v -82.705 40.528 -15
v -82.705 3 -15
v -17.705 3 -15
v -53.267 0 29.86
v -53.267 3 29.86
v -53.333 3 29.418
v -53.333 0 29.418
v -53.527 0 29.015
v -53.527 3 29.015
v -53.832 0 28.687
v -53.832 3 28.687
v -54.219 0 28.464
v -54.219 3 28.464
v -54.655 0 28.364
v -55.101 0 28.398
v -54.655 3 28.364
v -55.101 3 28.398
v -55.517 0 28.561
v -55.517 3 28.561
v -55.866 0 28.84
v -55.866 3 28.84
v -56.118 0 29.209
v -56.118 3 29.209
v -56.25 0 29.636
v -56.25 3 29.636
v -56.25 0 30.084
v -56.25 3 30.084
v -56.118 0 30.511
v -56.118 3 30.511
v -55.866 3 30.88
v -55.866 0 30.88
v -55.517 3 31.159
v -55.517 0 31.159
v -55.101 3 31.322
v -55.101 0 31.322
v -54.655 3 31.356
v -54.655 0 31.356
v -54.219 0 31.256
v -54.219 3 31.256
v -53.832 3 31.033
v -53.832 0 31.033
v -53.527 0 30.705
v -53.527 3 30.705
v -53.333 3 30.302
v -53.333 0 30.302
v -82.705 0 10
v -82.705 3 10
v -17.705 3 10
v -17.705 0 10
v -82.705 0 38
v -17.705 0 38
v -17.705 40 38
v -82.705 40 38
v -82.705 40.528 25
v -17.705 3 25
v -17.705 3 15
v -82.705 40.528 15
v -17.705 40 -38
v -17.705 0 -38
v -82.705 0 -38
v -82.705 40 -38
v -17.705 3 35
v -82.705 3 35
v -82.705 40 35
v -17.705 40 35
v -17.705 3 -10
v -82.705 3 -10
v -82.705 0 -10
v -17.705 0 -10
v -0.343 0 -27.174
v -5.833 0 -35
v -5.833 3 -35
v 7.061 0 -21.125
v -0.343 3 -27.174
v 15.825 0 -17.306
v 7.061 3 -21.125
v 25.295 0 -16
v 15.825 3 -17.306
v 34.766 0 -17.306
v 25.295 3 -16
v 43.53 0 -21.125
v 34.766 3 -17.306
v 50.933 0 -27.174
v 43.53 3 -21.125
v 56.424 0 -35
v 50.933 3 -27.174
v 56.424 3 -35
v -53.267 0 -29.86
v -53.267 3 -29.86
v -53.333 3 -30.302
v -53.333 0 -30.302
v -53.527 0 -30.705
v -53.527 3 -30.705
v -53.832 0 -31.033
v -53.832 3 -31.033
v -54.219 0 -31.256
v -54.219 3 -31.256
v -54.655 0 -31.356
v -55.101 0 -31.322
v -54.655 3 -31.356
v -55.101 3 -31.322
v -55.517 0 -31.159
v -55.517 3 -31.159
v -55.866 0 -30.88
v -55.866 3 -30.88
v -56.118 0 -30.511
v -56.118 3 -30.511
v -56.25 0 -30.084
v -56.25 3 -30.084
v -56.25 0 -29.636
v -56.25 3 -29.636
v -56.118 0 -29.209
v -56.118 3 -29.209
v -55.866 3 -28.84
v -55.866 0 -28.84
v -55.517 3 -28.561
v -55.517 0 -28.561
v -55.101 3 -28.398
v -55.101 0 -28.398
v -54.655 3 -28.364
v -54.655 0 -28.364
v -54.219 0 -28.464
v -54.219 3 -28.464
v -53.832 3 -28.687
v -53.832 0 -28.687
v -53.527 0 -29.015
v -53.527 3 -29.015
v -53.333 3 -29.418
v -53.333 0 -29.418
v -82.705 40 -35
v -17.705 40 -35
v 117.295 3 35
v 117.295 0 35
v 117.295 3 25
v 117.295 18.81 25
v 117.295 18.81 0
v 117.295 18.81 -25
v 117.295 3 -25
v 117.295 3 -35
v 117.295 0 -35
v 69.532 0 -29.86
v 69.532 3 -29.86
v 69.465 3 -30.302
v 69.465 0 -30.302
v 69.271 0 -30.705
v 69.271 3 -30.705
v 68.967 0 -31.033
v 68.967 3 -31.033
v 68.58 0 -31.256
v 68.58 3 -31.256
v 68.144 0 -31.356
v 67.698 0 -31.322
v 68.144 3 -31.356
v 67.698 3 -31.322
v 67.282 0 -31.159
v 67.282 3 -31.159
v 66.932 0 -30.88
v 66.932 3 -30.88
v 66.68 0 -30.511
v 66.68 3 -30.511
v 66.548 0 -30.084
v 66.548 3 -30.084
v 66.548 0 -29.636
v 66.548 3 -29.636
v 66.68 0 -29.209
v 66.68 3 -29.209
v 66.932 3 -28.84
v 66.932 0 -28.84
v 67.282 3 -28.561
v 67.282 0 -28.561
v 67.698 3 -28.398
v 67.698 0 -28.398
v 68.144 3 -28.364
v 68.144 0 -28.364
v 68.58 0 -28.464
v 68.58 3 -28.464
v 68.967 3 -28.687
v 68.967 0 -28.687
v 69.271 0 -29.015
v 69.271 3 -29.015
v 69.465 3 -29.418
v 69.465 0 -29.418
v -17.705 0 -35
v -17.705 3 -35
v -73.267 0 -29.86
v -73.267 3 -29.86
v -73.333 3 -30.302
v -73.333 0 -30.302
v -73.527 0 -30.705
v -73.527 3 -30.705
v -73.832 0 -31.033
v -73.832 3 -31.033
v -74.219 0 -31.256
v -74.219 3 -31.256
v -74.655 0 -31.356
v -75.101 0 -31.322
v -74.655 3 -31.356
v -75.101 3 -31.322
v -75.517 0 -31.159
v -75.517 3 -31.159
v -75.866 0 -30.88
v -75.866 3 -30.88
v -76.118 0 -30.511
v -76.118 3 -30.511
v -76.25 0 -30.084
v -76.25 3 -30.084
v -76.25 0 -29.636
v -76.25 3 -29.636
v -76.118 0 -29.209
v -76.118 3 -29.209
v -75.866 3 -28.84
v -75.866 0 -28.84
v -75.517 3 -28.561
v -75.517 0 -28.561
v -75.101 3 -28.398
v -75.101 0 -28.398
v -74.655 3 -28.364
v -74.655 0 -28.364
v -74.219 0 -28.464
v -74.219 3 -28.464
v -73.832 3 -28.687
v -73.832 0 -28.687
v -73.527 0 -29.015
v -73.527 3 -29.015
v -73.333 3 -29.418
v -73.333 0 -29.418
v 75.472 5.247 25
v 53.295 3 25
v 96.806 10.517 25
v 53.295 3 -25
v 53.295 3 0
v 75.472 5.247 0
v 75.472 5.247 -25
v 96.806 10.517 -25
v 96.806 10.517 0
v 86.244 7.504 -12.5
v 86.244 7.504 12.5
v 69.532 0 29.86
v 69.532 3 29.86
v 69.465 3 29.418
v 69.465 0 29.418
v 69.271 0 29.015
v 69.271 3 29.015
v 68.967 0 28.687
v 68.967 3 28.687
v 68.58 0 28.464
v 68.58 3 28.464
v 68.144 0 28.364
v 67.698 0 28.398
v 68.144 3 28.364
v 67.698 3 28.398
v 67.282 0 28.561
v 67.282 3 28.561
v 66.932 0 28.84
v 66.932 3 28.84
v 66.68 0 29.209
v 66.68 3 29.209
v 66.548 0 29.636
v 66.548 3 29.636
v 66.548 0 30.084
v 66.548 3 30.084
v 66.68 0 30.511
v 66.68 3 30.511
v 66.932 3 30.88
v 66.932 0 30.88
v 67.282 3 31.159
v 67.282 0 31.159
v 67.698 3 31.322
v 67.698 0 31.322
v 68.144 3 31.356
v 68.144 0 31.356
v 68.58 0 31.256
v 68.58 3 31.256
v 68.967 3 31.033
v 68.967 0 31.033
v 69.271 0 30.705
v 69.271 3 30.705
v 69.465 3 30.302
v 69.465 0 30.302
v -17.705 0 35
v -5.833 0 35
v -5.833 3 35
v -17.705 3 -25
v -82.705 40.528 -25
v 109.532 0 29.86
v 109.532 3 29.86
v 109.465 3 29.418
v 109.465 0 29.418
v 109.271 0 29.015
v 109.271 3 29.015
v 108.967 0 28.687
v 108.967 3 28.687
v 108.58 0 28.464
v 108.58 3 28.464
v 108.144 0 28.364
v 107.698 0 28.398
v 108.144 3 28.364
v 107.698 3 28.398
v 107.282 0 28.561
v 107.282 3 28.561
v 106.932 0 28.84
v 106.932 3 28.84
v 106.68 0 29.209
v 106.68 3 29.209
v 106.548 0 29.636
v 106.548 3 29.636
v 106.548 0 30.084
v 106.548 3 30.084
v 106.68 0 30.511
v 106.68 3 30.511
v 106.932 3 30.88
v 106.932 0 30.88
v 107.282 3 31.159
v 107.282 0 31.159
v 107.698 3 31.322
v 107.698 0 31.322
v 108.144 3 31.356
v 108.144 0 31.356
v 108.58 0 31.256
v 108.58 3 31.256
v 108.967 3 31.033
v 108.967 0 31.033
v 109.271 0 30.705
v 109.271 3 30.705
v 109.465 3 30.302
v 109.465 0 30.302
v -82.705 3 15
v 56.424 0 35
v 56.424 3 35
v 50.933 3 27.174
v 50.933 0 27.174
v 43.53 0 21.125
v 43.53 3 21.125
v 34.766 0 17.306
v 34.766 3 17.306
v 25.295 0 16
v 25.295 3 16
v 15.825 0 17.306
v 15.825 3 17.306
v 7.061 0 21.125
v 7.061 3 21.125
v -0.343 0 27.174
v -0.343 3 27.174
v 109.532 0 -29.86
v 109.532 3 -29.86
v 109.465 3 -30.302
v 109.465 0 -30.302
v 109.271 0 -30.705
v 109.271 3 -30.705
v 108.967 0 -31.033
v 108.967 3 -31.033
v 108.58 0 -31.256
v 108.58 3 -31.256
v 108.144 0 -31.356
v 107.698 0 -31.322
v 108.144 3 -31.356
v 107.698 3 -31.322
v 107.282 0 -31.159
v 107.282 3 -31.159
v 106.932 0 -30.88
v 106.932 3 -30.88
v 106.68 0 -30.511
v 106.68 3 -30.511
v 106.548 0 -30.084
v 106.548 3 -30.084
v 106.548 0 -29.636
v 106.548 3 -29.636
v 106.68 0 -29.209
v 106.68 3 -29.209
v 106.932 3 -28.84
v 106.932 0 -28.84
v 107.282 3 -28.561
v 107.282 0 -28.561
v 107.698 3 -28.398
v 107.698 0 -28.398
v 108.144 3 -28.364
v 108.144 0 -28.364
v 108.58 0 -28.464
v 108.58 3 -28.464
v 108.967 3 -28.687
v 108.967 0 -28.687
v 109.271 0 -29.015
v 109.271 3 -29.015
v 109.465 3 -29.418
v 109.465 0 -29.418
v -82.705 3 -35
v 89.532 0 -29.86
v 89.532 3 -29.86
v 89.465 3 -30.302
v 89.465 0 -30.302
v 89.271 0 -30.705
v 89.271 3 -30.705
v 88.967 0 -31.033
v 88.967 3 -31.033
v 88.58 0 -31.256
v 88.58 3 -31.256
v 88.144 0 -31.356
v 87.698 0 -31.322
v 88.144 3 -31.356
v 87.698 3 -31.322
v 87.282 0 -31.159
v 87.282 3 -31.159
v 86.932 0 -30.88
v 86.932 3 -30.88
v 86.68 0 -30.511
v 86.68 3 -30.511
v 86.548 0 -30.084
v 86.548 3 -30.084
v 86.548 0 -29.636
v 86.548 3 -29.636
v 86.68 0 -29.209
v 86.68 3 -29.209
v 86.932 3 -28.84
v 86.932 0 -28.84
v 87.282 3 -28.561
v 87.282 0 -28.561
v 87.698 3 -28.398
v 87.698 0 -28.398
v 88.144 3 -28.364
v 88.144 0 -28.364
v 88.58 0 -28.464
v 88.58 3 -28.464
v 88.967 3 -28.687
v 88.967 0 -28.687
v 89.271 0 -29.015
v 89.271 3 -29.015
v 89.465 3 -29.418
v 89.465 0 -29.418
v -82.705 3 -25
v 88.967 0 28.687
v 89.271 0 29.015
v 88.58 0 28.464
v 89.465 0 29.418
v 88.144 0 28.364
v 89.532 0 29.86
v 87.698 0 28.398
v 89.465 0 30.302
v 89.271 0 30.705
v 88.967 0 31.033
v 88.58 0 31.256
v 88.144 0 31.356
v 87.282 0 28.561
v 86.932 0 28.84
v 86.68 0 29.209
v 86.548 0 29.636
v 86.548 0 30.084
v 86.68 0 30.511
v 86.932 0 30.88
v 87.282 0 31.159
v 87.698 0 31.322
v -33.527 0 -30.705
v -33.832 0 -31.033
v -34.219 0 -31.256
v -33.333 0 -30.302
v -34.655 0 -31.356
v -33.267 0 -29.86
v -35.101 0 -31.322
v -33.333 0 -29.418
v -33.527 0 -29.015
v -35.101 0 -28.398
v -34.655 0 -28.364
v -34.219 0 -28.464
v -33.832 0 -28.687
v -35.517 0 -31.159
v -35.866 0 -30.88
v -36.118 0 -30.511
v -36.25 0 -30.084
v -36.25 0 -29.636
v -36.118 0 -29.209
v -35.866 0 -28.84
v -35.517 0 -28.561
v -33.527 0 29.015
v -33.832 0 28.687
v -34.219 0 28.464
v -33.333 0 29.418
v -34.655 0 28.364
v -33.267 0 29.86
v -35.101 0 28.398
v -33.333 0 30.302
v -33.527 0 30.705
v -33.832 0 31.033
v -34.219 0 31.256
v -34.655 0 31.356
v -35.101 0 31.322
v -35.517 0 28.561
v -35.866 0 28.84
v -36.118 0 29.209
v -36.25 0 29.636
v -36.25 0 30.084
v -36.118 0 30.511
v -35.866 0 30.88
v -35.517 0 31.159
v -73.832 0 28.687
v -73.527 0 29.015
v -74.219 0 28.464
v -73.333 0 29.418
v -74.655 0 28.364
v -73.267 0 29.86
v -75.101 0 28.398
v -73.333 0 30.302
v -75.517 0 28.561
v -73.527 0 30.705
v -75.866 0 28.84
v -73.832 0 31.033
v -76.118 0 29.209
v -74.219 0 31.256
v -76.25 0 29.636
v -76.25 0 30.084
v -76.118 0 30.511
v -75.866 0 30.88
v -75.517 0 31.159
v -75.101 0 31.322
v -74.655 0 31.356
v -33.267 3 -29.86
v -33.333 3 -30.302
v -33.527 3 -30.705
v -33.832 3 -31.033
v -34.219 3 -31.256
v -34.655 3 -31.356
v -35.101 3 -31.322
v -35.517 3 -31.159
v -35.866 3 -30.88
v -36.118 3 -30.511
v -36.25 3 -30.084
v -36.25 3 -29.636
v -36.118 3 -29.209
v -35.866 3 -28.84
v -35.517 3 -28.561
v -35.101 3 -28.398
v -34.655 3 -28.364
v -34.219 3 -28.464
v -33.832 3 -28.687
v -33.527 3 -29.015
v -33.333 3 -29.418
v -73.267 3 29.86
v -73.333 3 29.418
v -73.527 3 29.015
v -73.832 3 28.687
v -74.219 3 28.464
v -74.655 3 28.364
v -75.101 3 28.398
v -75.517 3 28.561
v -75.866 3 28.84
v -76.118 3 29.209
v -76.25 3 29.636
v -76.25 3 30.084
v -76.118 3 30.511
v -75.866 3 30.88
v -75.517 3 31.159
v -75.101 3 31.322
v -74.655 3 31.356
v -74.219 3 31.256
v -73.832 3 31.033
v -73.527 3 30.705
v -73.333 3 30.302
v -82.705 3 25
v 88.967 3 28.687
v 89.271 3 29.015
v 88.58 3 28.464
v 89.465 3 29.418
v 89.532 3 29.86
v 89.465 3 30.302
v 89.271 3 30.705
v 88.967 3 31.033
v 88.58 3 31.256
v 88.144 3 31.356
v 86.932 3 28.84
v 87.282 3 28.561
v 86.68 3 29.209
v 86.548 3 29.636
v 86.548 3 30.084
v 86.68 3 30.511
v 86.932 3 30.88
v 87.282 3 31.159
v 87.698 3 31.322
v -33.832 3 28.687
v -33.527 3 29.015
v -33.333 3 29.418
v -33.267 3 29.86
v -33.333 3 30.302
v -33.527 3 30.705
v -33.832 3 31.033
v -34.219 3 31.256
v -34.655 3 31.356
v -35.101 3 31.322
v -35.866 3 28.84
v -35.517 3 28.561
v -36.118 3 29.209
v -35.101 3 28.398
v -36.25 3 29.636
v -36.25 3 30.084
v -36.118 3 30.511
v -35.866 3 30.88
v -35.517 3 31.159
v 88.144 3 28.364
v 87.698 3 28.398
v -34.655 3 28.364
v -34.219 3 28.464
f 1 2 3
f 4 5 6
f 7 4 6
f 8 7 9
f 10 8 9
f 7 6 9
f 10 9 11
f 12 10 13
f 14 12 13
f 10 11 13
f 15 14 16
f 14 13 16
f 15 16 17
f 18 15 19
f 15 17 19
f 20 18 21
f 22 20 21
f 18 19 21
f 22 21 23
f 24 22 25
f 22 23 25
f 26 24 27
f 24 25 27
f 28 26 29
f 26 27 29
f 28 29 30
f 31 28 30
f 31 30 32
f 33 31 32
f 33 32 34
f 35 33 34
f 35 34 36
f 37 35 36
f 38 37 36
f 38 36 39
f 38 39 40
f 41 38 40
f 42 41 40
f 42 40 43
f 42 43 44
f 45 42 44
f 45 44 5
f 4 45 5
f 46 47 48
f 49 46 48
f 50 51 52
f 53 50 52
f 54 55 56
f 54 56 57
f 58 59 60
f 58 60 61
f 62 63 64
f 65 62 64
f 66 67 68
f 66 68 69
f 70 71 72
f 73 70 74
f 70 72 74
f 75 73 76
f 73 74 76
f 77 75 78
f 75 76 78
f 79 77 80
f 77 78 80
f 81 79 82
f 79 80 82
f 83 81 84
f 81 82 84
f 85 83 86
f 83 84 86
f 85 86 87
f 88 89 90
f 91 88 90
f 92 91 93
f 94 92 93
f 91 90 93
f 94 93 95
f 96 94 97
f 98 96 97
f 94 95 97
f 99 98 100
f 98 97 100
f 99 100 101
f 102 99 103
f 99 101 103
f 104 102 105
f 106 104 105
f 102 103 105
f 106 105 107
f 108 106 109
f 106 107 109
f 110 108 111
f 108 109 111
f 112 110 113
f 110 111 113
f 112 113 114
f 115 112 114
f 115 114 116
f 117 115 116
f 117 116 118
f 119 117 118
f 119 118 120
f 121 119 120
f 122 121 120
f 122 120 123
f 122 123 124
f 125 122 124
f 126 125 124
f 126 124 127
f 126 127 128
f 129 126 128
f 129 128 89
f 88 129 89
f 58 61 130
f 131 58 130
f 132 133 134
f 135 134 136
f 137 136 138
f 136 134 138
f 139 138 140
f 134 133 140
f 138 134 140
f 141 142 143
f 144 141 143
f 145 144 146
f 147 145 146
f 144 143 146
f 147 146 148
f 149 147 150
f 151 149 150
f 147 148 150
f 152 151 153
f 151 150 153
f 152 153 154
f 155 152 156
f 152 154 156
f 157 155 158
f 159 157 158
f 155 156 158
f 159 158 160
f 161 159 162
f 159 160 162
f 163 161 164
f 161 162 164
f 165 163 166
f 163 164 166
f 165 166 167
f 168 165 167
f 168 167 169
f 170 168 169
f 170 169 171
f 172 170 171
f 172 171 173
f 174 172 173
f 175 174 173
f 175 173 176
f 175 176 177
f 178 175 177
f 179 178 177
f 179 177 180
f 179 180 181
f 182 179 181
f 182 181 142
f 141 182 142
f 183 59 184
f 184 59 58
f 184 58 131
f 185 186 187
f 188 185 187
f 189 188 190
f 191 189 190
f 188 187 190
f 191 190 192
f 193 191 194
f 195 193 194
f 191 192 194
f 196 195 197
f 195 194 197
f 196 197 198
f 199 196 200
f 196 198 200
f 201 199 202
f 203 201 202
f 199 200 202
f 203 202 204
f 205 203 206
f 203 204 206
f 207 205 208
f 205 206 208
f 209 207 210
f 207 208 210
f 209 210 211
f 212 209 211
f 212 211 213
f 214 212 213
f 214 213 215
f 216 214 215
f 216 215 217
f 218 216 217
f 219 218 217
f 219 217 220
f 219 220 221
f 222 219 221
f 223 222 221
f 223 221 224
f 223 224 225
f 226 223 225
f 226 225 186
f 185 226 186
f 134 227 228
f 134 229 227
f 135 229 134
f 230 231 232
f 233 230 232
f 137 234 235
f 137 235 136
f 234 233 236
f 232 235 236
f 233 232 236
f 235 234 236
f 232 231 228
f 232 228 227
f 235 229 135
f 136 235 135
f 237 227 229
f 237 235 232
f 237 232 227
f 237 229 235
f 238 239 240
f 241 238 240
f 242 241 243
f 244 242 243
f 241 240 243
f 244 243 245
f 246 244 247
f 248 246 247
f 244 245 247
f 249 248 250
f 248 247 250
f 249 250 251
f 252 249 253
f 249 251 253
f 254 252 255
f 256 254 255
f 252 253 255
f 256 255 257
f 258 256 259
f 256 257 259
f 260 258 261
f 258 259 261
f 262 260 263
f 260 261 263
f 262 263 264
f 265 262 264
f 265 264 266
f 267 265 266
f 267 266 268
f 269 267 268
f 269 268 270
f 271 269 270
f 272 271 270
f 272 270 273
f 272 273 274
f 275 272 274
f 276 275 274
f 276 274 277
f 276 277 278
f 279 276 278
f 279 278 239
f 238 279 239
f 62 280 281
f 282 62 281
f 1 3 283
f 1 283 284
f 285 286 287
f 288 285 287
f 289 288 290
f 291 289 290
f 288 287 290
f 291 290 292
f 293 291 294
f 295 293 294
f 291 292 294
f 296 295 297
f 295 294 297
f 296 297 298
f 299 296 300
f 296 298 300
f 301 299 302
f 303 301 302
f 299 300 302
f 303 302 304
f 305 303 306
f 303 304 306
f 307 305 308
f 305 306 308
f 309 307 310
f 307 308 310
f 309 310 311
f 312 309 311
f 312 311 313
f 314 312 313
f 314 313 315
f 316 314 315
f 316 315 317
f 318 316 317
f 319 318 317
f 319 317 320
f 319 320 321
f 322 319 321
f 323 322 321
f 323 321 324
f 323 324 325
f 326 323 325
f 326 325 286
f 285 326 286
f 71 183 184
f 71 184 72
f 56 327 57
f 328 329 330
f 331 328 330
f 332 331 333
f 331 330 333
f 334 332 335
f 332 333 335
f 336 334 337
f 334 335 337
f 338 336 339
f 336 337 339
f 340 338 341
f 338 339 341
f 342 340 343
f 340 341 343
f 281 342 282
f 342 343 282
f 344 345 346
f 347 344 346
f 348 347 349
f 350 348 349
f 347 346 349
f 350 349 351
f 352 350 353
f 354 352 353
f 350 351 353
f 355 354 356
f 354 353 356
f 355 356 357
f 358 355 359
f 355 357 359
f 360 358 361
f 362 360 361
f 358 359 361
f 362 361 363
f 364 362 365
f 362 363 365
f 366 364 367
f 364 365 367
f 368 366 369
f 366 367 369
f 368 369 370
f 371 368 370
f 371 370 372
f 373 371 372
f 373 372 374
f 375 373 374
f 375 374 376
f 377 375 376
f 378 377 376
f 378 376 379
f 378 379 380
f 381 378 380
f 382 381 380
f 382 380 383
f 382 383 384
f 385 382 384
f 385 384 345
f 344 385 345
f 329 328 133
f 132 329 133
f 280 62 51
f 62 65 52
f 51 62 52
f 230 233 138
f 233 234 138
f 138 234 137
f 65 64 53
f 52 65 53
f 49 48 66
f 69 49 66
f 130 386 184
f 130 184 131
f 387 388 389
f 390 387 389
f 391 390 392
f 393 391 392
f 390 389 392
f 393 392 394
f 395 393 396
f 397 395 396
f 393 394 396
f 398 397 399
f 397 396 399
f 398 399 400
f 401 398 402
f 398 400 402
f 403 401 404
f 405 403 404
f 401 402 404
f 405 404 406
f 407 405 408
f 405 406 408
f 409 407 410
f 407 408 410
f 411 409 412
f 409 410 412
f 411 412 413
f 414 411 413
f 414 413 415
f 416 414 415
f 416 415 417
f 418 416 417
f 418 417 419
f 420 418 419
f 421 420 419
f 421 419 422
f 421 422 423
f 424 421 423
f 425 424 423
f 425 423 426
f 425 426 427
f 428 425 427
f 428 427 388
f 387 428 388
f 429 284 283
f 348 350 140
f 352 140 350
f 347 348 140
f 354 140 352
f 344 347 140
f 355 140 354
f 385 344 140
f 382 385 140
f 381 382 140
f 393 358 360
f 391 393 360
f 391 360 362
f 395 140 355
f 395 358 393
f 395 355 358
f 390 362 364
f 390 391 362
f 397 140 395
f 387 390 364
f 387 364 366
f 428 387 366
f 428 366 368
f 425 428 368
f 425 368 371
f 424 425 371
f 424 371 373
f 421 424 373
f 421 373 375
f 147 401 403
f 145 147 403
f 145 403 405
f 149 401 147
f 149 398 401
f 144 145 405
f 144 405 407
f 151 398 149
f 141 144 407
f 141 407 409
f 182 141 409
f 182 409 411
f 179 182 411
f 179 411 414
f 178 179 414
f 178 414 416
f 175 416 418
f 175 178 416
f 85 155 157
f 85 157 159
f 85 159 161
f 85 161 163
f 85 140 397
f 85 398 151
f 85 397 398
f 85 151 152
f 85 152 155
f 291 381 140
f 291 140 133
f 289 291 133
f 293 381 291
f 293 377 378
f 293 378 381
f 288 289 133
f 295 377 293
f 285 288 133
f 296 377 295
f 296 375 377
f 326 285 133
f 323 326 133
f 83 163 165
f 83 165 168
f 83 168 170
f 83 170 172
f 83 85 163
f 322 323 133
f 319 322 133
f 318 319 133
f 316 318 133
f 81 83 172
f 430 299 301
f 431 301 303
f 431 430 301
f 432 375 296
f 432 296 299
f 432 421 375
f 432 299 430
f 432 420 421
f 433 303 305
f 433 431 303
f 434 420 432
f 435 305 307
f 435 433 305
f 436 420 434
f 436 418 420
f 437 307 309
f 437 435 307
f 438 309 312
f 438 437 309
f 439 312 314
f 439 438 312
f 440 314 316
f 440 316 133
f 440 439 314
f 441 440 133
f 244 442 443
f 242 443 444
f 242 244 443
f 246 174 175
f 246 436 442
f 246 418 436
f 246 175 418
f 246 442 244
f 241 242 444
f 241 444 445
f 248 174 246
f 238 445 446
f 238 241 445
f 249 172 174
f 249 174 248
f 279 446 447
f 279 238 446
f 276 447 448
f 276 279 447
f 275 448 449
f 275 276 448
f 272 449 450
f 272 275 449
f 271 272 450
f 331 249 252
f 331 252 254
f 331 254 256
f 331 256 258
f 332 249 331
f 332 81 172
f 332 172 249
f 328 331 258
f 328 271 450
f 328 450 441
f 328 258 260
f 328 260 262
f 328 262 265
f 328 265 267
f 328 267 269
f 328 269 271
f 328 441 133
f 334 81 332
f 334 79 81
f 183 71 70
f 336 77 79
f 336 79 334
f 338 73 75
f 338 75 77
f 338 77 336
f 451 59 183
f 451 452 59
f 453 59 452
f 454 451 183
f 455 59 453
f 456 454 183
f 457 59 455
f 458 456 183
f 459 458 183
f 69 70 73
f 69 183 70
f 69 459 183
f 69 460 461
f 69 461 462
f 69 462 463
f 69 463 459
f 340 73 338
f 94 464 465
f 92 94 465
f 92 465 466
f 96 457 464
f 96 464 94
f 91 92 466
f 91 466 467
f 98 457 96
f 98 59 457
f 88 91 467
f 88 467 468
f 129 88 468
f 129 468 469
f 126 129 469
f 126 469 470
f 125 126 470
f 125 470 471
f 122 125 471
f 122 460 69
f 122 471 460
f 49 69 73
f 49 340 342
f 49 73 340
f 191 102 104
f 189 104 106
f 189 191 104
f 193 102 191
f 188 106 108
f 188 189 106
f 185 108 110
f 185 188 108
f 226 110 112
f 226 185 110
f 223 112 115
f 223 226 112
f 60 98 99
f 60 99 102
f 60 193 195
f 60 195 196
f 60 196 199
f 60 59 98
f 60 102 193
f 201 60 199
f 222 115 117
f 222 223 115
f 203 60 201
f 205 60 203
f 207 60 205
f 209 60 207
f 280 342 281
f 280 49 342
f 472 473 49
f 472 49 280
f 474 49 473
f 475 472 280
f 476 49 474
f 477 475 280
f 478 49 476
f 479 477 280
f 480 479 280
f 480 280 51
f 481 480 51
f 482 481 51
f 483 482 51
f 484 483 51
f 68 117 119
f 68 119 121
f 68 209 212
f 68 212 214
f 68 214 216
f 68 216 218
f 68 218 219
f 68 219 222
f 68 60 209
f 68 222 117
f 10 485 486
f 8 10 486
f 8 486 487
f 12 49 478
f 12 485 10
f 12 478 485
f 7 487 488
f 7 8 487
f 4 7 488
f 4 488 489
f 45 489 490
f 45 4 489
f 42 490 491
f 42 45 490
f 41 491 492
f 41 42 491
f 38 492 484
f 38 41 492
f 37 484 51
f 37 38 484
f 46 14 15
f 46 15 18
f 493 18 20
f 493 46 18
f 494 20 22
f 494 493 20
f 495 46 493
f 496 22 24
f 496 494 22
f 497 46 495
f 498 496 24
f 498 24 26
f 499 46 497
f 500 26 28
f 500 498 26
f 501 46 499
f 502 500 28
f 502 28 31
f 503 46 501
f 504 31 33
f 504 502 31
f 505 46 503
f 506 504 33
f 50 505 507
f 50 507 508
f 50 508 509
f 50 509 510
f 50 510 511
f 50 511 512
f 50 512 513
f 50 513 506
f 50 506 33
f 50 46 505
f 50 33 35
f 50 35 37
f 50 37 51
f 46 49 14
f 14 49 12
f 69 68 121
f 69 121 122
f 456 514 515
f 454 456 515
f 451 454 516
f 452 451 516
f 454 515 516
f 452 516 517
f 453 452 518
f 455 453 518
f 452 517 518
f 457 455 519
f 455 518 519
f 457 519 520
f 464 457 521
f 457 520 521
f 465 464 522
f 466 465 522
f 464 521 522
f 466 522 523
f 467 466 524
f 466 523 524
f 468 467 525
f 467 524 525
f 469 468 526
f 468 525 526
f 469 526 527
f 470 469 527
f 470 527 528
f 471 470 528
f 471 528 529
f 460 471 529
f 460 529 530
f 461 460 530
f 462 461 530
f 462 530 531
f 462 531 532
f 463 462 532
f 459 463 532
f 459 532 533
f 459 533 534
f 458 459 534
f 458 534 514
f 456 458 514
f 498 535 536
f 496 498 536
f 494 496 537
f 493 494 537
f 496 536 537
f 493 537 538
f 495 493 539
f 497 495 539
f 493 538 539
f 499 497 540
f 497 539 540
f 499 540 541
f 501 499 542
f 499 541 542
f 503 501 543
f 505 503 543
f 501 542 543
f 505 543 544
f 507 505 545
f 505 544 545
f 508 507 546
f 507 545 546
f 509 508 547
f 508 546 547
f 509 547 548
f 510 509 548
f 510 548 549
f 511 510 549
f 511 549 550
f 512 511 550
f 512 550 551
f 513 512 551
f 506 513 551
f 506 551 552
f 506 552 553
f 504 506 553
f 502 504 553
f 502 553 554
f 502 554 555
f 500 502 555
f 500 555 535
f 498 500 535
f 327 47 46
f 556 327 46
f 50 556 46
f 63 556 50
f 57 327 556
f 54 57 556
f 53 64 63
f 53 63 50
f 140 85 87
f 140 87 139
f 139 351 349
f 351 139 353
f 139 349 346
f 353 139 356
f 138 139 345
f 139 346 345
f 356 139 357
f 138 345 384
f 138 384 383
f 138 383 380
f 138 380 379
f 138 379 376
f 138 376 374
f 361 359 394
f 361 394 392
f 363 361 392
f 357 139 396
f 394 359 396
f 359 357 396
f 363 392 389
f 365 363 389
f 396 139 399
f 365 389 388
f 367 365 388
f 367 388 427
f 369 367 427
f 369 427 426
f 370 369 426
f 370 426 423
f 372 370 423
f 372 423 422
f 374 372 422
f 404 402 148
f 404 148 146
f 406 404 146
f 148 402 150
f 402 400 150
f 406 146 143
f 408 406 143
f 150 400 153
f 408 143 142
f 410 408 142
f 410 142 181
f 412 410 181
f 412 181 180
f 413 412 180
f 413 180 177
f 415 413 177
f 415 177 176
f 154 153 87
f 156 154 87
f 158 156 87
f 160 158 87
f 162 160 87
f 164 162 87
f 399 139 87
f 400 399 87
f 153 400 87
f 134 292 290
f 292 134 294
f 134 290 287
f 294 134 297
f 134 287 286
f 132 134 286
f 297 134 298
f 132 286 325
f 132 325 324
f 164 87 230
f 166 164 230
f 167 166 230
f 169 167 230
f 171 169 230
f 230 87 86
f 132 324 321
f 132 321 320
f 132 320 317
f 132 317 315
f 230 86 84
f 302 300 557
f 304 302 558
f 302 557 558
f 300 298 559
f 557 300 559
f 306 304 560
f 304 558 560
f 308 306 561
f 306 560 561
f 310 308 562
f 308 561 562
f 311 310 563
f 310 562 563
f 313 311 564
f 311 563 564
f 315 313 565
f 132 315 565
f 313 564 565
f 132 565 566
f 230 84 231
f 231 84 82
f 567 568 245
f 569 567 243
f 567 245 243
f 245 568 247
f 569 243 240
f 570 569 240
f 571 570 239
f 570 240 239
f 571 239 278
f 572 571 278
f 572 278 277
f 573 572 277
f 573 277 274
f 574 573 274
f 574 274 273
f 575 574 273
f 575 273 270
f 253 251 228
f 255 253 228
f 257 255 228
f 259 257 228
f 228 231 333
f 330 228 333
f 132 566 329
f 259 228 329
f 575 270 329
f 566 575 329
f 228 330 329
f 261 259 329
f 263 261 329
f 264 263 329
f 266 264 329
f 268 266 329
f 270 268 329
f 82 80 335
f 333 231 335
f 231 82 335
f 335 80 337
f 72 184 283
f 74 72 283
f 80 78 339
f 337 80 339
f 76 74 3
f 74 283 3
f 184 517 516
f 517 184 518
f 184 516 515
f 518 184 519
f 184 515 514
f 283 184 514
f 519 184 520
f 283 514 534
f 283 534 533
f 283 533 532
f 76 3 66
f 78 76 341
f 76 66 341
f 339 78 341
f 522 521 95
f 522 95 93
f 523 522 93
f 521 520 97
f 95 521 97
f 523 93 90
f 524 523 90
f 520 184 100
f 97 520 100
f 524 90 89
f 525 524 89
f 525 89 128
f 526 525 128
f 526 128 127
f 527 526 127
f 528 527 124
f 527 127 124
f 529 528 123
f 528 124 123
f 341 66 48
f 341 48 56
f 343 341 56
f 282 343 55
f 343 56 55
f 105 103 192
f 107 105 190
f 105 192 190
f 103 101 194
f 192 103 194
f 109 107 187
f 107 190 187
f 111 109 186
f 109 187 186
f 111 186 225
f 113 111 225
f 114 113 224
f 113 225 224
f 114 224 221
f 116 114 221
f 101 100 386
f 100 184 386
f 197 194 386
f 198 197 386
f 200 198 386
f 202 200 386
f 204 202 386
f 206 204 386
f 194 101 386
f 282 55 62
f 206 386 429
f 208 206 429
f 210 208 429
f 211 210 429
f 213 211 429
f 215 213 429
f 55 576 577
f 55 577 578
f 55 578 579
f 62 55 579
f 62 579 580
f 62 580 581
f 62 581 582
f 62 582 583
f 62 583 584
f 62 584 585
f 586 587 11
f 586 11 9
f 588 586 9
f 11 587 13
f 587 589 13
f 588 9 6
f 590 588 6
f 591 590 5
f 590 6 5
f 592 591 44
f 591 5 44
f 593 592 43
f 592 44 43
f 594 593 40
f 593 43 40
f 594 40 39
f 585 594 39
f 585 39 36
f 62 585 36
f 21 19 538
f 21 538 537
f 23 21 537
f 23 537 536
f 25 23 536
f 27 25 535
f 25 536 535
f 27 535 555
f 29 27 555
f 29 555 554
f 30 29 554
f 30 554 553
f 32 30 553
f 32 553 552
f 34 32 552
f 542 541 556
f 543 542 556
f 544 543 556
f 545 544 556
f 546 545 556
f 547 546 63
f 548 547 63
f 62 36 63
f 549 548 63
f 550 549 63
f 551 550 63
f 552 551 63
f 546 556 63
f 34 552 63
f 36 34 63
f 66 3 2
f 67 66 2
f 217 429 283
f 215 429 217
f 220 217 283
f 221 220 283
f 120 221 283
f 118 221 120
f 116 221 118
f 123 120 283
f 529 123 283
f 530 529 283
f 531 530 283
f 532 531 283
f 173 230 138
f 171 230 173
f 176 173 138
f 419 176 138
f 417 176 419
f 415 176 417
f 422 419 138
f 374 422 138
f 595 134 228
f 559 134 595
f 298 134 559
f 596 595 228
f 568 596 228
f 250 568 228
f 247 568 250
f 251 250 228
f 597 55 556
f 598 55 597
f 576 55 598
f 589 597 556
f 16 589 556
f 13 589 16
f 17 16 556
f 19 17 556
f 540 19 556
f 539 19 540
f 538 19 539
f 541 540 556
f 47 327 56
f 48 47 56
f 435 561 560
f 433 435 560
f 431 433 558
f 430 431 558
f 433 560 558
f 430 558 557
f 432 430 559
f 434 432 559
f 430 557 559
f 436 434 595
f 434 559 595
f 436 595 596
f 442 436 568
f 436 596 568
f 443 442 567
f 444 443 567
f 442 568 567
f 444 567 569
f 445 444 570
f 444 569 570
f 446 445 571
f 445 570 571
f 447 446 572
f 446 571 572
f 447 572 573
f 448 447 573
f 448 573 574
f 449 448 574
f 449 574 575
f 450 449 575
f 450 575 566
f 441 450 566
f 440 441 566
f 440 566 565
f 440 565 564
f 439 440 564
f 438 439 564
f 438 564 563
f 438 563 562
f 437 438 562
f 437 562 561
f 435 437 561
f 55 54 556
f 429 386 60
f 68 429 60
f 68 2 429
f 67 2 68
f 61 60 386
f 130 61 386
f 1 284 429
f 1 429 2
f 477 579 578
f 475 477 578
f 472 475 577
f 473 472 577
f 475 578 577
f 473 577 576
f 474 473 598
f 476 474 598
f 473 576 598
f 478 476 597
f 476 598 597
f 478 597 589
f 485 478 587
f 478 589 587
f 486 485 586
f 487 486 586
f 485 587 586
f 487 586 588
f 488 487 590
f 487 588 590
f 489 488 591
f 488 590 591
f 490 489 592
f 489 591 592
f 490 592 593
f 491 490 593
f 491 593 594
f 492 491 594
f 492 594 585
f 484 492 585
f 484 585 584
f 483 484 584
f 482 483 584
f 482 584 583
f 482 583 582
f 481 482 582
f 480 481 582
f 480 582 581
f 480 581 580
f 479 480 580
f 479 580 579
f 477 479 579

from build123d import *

# Parameters (mm, degrees)
SKETCH_1_W           = 200
SKETCH_1_H           = 70
EXTRUDE_1_DEPTH      = 3
EXTRUDE_2_DEPTH      = 25
EXTRUDE_2_DEPTH_BACK = 25
SKETCH_6_W           = 30
SKETCH_6_H           = 37.527767497
CUT_EXTRUDE_4_DEPTH  = 65
SKETCH_7_R           = 35
CUT_EXTRUDE_5_DEPTH  = 4
SKETCH_8_W           = 3
SKETCH_8_H           = 40
EXTRUDE_3_DEPTH      = 65
SKETCH_9_R           = 1.5
CUT_EXTRUDE_6_DEPTH  = 4
SKETCH_11_W          = 65
SKETCH_11_H          = 20
CUT_EXTRUDE_7_DEPTH  = 4


with BuildPart() as part:
    # 草图1 → 凸台-拉伸1 (new body)
    with BuildSketch(Plane(origin=(0, 0, 0), x_dir=(1, 0, 0), z_dir=(0, 1, 0))):
        with Locations((17.295373665, 0)):
            Rectangle(SKETCH_1_W, SKETCH_1_H)
    extrude(amount=EXTRUDE_1_DEPTH)

    # 草图2 → 凸台-拉伸2 (add, two sides)
    with BuildSketch(Plane.XY) as extrude_2_sk:
        Polygon((-82.704626335, 40.527767497), (-82.704626335, 3), (-17.704626335, 3), align=None)
        with BuildLine():
            Line((117.295373665, 3), (117.295373665, 18.810437945))
            add(Edge.make_bspline(
                [(53.295373665, 3), (87.19337421, 4.102292249), (117.295373665, 18.810437945)],
                knots=[0, 0, 0, 1, 1, 1], degree=2))
            Line((53.295373665, 3), (117.295373665, 3))
        make_face()
    extrude(amount=EXTRUDE_2_DEPTH)
    extrude(extrude_2_sk.sketch, amount=-EXTRUDE_2_DEPTH_BACK)

    # 草图6 → 切除-拉伸4 (cut)
    with BuildSketch(Plane.ZY.offset(82.704626335)):
        with Locations((0, 21.763883748)):
            Rectangle(SKETCH_6_W, SKETCH_6_H)
    extrude(amount=-CUT_EXTRUDE_4_DEPTH, mode=Mode.SUBTRACT)

    # 草图7 → 切除-拉伸5 (cut, through all)
    with BuildSketch(Plane(origin=(0, 3, 0), x_dir=(1, 0, 0), z_dir=(0, 1, 0))):
        with Locations((25.295373665, 51)):
            Circle(SKETCH_7_R)
        with Locations((25.295373665, -51)):
            Circle(SKETCH_7_R)
    extrude(amount=-CUT_EXTRUDE_5_DEPTH, mode=Mode.SUBTRACT)

    # 草图8 → 凸台-拉伸3 (add)
    with BuildSketch(Plane.ZY.offset(82.704626335)):
        with Locations((36.5, 20)):
            Rectangle(SKETCH_8_W, SKETCH_8_H)
        with Locations((-36.5, 20)):
            Rectangle(SKETCH_8_W, SKETCH_8_H)
    extrude(amount=-EXTRUDE_3_DEPTH)

    # 草图9 → 切除-拉伸6 (cut, through all)
    with BuildSketch(Plane(origin=(0, 3, 0), x_dir=(1, 0, 0), z_dir=(0, 1, 0))):
        with Locations((-74.766784803, 29.860059225)):
            Circle(SKETCH_9_R)
        with Locations((-54.766784803, 29.860059225)):
            Circle(SKETCH_9_R)
        with Locations((-34.766784803, 29.860059225)):
            Circle(SKETCH_9_R)
        with Locations((-34.766784803, -29.860059225)):
            Circle(SKETCH_9_R)
        with Locations((-54.766784803, -29.860059225)):
            Circle(SKETCH_9_R)
        with Locations((-74.766784803, -29.860059225)):
            Circle(SKETCH_9_R)
        with Locations((68.031562246, 29.860059225)):
            Circle(SKETCH_9_R)
        with Locations((88.031562246, 29.860059225)):
            Circle(SKETCH_9_R)
        with Locations((108.031562246, 29.860059225)):
            Circle(SKETCH_9_R)
        with Locations((108.031562246, -29.860059225)):
            Circle(SKETCH_9_R)
        with Locations((88.031562246, -29.860059225)):
            Circle(SKETCH_9_R)
        with Locations((68.031562246, -29.860059225)):
            Circle(SKETCH_9_R)
    extrude(amount=-CUT_EXTRUDE_6_DEPTH, mode=Mode.SUBTRACT)

    # 草图11 → 切除-拉伸7 (cut, through all)
    with BuildSketch(Plane(origin=(0, 3, 0), x_dir=(1, 0, 0), z_dir=(0, 1, 0))):
        with Locations((-50.204626335, 0)):
            Rectangle(SKETCH_11_W, SKETCH_11_H)
    extrude(amount=-CUT_EXTRUDE_7_DEPTH, mode=Mode.SUBTRACT)


solid = part.part
